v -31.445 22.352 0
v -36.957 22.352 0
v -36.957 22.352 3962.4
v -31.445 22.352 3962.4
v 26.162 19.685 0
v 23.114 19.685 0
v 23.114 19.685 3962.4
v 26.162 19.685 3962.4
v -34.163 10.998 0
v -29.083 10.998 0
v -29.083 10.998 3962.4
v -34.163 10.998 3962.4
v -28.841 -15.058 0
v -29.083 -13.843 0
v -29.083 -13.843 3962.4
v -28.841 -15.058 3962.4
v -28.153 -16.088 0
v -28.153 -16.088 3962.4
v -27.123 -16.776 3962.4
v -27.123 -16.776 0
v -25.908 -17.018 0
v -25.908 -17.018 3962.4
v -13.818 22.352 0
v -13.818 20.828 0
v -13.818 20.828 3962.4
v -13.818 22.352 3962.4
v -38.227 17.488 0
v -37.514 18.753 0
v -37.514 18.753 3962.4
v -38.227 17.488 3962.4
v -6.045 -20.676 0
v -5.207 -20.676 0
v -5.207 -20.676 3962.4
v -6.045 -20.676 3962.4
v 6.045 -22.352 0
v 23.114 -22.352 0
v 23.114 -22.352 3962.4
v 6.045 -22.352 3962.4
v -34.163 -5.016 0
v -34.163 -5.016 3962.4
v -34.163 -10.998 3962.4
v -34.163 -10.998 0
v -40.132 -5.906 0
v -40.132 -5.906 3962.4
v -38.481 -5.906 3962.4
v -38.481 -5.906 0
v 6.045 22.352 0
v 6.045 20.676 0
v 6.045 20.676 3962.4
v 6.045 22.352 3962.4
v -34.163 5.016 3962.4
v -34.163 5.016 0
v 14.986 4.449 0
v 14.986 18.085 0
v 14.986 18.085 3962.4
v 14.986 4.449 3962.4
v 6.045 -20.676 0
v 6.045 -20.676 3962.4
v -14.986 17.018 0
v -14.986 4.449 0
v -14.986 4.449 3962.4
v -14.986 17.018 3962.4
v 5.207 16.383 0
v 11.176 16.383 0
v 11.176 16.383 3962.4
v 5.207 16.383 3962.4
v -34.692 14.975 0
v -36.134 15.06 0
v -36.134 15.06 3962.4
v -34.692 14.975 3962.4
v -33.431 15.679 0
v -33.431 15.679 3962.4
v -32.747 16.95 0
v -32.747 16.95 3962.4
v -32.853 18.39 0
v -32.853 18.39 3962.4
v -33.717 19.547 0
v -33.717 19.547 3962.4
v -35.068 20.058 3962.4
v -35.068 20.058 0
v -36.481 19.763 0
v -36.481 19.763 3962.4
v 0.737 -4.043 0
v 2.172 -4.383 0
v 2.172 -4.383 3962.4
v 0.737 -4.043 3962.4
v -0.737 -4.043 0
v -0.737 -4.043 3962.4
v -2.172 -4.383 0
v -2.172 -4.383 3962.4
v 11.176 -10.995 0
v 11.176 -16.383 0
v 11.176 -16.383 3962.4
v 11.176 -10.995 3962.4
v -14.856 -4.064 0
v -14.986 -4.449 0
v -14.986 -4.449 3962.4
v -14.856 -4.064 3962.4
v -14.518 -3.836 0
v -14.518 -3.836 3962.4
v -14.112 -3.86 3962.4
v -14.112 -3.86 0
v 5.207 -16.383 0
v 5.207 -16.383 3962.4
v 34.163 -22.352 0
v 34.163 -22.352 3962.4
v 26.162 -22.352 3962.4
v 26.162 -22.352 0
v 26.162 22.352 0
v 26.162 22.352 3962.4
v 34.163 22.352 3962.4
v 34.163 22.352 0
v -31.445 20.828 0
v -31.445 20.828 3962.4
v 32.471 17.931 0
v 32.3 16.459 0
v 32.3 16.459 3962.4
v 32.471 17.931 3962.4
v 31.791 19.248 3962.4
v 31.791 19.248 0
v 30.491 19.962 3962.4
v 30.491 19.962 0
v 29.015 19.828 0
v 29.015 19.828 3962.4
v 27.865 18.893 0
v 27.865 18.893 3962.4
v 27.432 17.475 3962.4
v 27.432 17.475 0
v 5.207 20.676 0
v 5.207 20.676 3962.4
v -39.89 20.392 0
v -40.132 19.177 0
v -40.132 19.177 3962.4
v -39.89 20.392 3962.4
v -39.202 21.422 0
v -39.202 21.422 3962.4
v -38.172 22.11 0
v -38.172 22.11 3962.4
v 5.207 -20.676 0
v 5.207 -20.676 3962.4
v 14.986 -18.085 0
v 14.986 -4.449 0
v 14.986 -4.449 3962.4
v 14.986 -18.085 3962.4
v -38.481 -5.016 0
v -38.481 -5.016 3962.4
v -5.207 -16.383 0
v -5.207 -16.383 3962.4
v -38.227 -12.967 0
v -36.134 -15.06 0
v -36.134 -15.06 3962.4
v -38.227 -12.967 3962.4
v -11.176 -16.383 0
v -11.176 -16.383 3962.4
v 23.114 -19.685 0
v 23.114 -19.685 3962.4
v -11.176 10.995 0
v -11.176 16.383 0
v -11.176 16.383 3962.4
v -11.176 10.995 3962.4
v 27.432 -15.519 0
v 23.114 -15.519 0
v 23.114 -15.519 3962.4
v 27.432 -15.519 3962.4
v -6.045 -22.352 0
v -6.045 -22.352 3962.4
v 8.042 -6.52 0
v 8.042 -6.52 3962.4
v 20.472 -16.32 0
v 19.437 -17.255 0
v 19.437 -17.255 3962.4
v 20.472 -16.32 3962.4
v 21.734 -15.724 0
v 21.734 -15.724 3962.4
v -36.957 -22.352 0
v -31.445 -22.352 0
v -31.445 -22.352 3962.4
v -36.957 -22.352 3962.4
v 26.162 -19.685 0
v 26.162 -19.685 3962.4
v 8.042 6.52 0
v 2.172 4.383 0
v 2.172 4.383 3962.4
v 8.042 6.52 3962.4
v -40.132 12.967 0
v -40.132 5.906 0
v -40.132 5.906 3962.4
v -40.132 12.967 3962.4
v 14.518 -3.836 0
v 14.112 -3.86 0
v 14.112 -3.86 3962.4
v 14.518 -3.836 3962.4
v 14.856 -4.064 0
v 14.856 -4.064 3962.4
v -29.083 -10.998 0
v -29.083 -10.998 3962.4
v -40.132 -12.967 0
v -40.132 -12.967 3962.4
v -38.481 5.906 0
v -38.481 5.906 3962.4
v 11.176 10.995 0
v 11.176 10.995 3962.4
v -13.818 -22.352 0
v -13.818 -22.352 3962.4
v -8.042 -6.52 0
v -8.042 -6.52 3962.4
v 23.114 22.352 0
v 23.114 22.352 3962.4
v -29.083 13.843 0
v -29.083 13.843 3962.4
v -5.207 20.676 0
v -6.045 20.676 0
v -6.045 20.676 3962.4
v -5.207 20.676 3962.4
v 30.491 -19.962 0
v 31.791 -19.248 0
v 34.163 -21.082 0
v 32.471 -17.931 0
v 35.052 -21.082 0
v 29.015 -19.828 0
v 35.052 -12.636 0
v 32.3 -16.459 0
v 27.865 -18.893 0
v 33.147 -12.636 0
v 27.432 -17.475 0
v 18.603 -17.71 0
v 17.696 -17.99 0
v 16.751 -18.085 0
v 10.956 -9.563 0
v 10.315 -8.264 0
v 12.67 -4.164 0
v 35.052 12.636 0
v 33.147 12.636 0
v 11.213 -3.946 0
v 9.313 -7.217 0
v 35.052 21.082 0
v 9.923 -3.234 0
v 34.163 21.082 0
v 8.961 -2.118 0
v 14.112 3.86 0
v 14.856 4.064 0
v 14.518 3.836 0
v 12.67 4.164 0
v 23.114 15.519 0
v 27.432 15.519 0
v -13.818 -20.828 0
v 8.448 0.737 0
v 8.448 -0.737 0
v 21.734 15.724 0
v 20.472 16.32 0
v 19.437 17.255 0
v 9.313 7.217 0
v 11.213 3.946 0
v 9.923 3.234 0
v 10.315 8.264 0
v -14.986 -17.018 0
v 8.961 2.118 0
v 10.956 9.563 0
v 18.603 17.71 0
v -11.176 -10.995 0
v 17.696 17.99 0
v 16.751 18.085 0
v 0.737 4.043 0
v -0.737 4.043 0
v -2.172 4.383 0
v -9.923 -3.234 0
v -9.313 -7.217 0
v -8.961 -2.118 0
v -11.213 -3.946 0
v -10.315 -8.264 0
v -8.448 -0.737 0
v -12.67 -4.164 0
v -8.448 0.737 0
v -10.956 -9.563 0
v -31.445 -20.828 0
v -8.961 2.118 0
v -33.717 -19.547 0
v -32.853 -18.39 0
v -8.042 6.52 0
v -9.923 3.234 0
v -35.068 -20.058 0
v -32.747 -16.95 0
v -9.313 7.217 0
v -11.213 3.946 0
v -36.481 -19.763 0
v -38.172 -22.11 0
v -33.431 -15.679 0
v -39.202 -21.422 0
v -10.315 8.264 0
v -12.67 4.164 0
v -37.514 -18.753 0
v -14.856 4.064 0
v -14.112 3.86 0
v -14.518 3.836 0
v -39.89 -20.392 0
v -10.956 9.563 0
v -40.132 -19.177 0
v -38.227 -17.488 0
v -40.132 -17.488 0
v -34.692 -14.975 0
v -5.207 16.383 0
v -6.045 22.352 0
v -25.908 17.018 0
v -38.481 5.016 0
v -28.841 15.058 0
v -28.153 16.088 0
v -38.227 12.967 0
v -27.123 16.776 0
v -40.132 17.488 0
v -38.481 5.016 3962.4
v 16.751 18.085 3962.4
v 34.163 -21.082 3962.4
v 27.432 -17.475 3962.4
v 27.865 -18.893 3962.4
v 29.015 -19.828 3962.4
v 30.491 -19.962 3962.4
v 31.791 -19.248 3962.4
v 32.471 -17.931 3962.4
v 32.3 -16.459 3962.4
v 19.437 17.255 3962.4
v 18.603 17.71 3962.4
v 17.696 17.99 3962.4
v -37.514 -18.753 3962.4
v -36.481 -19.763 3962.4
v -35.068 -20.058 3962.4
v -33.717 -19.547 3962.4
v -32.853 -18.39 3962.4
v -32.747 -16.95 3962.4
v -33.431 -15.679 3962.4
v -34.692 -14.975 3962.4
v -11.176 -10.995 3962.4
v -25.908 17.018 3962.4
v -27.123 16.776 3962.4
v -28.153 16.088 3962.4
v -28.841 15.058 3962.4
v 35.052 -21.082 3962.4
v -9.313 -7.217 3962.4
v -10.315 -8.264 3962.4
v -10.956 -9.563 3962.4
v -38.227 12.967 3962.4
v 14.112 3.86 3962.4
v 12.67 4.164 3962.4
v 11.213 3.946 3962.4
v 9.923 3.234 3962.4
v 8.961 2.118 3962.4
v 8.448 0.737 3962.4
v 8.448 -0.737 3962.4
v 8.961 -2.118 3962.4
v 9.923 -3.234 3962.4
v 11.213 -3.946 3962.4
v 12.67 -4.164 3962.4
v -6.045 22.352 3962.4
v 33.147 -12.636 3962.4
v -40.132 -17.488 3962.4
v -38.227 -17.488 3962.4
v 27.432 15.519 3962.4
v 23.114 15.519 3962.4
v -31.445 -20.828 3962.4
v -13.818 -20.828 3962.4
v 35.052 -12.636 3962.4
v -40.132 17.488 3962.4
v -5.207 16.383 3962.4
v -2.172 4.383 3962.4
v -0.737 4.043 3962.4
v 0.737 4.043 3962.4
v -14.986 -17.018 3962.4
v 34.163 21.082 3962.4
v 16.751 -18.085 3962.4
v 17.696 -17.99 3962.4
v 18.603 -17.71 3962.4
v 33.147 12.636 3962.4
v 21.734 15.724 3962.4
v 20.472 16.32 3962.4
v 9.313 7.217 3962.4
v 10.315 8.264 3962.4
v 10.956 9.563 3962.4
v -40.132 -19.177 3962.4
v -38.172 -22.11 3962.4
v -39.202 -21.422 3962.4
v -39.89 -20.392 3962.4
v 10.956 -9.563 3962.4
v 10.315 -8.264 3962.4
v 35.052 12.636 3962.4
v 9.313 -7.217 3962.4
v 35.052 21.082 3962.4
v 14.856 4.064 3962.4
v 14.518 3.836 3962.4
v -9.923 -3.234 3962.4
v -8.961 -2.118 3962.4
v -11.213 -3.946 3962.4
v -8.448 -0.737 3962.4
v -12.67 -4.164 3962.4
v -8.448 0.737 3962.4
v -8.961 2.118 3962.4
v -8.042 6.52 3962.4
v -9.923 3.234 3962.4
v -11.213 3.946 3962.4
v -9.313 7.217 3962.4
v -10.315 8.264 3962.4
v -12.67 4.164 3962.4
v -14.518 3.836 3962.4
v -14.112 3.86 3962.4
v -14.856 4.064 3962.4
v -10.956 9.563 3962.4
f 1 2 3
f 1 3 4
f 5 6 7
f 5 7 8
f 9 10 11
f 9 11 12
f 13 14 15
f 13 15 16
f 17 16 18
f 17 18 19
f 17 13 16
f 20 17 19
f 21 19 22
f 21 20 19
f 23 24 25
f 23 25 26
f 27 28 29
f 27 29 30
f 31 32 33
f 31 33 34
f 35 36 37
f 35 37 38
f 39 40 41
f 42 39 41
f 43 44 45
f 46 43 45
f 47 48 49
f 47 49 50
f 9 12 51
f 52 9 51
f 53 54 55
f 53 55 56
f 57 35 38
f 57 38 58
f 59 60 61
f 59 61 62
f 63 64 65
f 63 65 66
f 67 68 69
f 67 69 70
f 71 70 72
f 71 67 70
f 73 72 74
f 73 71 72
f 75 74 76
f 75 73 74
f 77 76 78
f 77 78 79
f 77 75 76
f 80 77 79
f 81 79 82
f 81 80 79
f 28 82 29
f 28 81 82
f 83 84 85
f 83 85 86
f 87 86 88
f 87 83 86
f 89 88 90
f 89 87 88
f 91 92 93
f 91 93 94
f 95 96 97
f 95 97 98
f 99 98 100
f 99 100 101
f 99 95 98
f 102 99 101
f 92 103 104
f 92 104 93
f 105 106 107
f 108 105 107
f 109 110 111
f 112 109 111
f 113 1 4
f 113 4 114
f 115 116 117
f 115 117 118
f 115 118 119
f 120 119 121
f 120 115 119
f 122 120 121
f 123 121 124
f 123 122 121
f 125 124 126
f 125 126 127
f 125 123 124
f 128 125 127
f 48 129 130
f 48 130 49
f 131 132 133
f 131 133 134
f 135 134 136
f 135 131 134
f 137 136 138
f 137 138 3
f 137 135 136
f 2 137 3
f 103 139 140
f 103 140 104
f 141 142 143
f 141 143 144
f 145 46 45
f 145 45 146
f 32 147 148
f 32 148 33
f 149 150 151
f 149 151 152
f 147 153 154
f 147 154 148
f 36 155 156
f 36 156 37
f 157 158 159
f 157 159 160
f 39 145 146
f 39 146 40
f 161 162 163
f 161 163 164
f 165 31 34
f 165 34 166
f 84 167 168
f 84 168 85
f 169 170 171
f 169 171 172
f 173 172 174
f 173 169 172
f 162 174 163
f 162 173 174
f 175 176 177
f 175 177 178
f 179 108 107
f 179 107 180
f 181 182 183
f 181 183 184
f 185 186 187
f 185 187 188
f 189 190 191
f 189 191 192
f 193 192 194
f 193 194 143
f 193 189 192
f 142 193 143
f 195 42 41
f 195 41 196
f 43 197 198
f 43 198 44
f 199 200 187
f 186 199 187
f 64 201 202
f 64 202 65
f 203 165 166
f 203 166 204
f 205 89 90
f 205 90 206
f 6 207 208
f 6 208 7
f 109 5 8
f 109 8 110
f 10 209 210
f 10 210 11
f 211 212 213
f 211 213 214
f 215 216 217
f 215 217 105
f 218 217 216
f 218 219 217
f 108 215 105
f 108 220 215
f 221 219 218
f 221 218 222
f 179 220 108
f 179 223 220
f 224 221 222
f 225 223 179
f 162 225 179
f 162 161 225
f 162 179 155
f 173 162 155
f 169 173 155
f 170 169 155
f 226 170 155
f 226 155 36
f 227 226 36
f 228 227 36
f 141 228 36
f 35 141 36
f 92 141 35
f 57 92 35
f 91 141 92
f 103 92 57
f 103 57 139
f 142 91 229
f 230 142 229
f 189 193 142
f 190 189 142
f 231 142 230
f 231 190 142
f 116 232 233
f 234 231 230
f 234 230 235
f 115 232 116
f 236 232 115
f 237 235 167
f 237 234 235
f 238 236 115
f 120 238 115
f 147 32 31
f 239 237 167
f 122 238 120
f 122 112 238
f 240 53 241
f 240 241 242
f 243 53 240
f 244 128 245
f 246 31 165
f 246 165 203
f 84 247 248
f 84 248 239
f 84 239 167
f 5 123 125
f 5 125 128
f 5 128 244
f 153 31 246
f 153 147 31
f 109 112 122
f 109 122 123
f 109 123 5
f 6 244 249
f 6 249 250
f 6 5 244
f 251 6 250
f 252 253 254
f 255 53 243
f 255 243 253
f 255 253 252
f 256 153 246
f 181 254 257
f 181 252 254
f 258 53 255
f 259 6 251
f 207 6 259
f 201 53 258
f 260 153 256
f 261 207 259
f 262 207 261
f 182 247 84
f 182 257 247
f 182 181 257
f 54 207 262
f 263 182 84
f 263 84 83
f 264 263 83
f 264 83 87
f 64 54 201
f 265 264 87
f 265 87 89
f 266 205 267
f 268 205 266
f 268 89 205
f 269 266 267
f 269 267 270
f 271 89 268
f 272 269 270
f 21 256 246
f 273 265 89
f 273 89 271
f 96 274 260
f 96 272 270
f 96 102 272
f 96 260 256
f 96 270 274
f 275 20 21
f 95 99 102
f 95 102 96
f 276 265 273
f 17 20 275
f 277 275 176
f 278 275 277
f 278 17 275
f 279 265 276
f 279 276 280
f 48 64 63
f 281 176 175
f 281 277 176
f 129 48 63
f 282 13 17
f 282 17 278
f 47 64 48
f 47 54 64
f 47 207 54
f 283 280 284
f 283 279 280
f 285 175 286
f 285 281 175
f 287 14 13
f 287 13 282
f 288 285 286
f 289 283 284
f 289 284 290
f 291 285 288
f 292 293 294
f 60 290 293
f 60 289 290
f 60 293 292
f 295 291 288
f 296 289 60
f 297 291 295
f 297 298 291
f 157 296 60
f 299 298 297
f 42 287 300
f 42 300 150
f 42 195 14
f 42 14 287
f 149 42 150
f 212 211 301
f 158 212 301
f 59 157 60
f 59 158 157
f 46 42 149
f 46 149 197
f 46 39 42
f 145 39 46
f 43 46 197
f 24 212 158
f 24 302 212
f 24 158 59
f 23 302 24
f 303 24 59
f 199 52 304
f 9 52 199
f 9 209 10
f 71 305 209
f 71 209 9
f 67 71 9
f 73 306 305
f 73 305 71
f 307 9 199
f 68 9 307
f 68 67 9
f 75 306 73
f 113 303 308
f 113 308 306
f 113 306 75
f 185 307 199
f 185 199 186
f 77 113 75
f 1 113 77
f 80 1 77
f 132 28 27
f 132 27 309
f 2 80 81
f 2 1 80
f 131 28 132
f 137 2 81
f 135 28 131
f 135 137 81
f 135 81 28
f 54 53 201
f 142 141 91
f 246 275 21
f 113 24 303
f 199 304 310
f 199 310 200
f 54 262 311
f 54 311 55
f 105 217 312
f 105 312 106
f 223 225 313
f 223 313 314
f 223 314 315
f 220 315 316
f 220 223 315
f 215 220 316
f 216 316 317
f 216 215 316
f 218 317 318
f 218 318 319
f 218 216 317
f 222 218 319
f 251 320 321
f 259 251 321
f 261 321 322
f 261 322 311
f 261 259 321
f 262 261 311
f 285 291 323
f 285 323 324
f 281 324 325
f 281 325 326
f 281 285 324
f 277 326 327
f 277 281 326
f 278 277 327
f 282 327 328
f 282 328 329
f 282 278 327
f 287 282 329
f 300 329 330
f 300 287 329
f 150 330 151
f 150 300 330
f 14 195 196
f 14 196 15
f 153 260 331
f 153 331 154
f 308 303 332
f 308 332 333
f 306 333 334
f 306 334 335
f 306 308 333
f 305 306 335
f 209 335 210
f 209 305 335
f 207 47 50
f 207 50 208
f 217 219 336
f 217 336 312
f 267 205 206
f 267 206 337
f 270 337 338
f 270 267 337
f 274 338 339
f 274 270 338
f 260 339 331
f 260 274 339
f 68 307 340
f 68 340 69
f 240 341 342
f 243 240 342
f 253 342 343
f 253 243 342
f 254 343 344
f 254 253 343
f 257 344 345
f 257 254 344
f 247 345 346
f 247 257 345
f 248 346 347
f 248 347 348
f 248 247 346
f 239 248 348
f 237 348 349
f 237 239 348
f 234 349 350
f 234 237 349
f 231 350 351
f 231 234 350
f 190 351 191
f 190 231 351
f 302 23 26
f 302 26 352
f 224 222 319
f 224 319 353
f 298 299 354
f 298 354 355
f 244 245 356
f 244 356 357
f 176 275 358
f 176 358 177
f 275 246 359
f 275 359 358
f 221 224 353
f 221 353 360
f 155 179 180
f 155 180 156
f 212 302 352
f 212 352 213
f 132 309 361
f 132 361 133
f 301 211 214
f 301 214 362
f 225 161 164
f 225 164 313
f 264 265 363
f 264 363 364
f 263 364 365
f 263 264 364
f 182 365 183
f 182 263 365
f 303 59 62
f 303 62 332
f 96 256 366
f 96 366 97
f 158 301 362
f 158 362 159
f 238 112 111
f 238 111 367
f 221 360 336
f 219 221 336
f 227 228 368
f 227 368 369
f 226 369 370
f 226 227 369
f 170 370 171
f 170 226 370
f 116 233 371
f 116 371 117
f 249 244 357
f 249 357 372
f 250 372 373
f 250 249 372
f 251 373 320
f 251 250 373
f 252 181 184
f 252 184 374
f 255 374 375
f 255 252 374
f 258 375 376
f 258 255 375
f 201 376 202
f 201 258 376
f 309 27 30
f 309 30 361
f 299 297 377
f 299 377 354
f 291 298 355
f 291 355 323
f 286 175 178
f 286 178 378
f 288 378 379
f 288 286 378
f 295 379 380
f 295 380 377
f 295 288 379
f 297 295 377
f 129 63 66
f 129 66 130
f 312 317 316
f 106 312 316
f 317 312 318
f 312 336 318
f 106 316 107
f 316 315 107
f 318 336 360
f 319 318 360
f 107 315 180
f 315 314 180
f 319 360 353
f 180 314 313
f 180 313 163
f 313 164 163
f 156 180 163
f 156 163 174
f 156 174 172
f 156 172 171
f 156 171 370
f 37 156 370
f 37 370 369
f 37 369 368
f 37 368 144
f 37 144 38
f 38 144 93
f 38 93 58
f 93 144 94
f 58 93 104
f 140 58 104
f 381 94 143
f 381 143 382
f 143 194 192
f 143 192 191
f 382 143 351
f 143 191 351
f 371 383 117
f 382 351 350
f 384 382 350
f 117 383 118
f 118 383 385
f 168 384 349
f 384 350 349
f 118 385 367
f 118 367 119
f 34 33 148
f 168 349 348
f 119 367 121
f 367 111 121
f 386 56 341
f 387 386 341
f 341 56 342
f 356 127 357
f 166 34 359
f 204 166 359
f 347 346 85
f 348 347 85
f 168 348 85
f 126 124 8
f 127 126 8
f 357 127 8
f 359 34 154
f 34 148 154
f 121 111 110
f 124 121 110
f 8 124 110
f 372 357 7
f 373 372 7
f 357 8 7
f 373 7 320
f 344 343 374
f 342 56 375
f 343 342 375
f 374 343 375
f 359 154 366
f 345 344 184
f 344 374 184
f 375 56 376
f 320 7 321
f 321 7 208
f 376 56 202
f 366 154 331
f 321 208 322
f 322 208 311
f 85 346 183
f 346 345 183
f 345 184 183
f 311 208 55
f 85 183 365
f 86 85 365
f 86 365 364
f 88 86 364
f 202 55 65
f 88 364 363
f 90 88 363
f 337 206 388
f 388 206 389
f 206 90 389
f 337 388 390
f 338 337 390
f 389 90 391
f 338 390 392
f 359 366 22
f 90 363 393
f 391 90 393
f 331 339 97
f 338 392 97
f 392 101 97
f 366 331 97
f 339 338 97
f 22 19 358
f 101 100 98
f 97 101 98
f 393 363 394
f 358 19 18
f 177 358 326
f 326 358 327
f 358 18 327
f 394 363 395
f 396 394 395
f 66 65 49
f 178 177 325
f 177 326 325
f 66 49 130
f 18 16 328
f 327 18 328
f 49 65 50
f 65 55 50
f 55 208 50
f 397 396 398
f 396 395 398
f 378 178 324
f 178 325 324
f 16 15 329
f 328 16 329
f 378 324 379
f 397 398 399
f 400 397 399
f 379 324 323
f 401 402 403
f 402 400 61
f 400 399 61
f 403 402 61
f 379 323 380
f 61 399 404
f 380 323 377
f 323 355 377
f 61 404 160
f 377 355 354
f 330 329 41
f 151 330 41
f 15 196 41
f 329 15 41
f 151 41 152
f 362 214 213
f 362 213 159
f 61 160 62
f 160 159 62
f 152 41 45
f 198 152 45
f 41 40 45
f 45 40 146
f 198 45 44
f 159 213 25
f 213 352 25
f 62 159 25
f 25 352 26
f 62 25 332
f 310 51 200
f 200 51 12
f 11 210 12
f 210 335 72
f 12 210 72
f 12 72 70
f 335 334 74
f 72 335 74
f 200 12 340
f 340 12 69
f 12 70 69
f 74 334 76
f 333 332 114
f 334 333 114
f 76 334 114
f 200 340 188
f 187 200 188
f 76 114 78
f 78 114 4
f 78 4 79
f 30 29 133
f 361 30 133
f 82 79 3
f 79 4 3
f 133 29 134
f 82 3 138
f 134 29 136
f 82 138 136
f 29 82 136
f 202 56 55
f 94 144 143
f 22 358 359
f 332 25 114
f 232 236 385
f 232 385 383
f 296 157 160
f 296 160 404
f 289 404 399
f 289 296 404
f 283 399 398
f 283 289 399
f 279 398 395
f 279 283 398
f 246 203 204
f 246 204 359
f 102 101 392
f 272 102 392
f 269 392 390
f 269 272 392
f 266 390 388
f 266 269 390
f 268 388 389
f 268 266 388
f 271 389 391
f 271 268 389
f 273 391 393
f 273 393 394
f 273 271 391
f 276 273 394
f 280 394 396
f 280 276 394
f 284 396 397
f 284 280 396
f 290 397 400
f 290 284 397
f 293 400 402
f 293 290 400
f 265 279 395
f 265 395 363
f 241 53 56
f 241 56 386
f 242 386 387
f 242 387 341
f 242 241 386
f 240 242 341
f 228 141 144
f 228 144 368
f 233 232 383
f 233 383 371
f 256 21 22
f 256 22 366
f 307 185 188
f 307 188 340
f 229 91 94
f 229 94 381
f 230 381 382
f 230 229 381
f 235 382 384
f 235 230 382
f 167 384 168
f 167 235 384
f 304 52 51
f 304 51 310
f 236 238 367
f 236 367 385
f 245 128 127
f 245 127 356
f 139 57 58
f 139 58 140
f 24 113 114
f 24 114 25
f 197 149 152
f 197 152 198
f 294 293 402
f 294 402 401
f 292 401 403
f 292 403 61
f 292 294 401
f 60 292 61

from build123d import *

# Parameters (mm, degrees)
EXTRUDE1_DEPTH = 3962.4


with BuildPart() as part:
    # Sketch1 → Extrude1 (new body)
    with BuildSketch(Plane.XY):
        with BuildLine():
            Line((-8.042370933, 6.520154777), (-2.17182791, 4.383451858))
            ThreePointArc((-2.17182791, 4.383451858), (0, 4.0005), (2.17182791, 4.383451858))
            Line((2.17182791, 4.383451858), (8.042370933, 6.520154777))
            ThreePointArc((8.042370933, 6.520154777), (10.314711611, 8.263783106), (11.176, 10.995440884))
            Line((11.176, 10.995440884), (11.176, 16.383))
            Line((11.176, 16.383), (5.207, 16.383))
            Line((5.207, 16.383), (5.207, 20.6756))
            Line((5.207, 20.6756), (6.0452, 20.6756))
            Line((6.0452, 20.6756), (6.0452, 22.352))
            Line((6.0452, 22.352), (23.114, 22.352))
            Line((23.114, 22.352), (23.114, 19.685))
            Line((23.114, 19.685), (26.162, 19.685))
            Line((26.162, 19.685), (26.162, 22.352))
            Line((26.162, 22.352), (34.163, 22.352))
            Line((34.163, 22.352), (34.163, 21.082))
            Line((34.163, 21.082), (35.052, 21.082))
            Line((35.052, 21.082), (35.052, 12.6365))
            Line((35.052, 12.6365), (33.147, 12.6365))
            Line((33.147, 12.6365), (32.299669473, 16.458561015))
            ThreePointArc((32.299669473, 16.458561015), (30.491287752, 19.961550786), (27.432, 17.4752))
            Line((27.432, 17.4752), (27.432, 15.5194))
            Line((27.432, 15.5194), (23.114, 15.5194))
            ThreePointArc((23.114, 15.5194), (21.080787287, 15.97522468), (19.436777108, 17.255443647))
            ThreePointArc((19.436777108, 17.255443647), (18.156613066, 17.872739697), (16.7513, 18.0848))
            Line((16.7513, 18.0848), (14.986, 18.0848))
            Line((14.986, 18.0848), (14.986, 4.448989638))
            ThreePointArc((14.986, 4.448989638), (14.705787924, 3.922348841), (14.112455026, 3.860498945))
            ThreePointArc((14.112455026, 3.860498945), (8.382, 0), (14.112455026, -3.860498945))
            ThreePointArc((14.112455026, -3.860498945), (14.705787924, -3.922348841), (14.986, -4.448989638))
            Line((14.986, -4.448989638), (14.986, -18.0848))
            Line((14.986, -18.0848), (16.7513, -18.0848))
            ThreePointArc((16.7513, -18.0848), (18.156613066, -17.872739697), (19.436777108, -17.255443647))
            ThreePointArc((19.436777108, -17.255443647), (21.080787287, -15.97522468), (23.114, -15.5194))
            Line((23.114, -15.5194), (27.432, -15.5194))
            Line((27.432, -15.5194), (27.432, -17.4752))
            ThreePointArc((27.432, -17.4752), (30.491287752, -19.961550786), (32.299669473, -16.458561015))
            Line((32.299669473, -16.458561015), (33.147, -12.6365))
            Line((33.147, -12.6365), (35.052, -12.6365))
            Line((35.052, -12.6365), (35.052, -21.082))
            Line((35.052, -21.082), (34.163, -21.082))
            Line((34.163, -21.082), (34.163, -22.352))
            Line((34.163, -22.352), (26.162, -22.352))
            Line((26.162, -22.352), (26.162, -19.685))
            Line((26.162, -19.685), (23.114, -19.685))
            Line((23.114, -19.685), (23.114, -22.352))
            Line((23.114, -22.352), (6.0452, -22.352))
            Line((6.0452, -22.352), (6.0452, -20.6756))
            Line((6.0452, -20.6756), (5.207, -20.6756))
            Line((5.207, -20.6756), (5.207, -16.383))
            Line((5.207, -16.383), (11.176, -16.383))
            Line((11.176, -16.383), (11.176, -10.995440884))
            ThreePointArc((11.176, -10.995440884), (10.314711611, -8.263783106), (8.042370933, -6.520154777))
            Line((8.042370933, -6.520154777), (2.17182791, -4.383451858))
            ThreePointArc((2.17182791, -4.383451858), (0, -4.0005), (-2.17182791, -4.383451858))
            Line((-2.17182791, -4.383451858), (-8.042370933, -6.520154777))
            ThreePointArc((-8.042370933, -6.520154777), (-10.314711611, -8.263783106), (-11.176, -10.995440884))
            Line((-11.176, -10.995440884), (-11.176, -16.383))
            Line((-11.176, -16.383), (-5.207, -16.383))
            Line((-5.207, -16.383), (-5.207, -20.6756))
            Line((-5.207, -20.6756), (-6.0452, -20.6756))
            Line((-6.0452, -20.6756), (-6.0452, -22.352))
            Line((-6.0452, -22.352), (-13.8176, -22.352))
            Line((-13.8176, -22.352), (-13.8176, -20.828))
            Line((-13.8176, -20.828), (-31.4452, -20.828))
            Line((-31.4452, -20.828), (-31.4452, -22.352))
            Line((-31.4452, -22.352), (-36.957, -22.352))
            ThreePointArc((-36.957, -22.352), (-39.20206403, -21.42206403), (-40.132, -19.177))
            Line((-40.132, -19.177), (-40.132, -17.4879))
            Line((-40.132, -17.4879), (-38.227, -17.4879))
            Line((-38.227, -17.4879), (-37.514055794, -18.753357925))
            ThreePointArc((-37.514055794, -18.753357925), (-32.852848443, -18.390189081), (-36.134047833, -15.059652167))
            Line((-36.134047833, -15.059652167), (-38.227, -12.9667))
            Line((-38.227, -12.9667), (-40.132, -12.9667))
            Line((-40.132, -12.9667), (-40.132, -5.9055))
            Line((-40.132, -5.9055), (-38.481, -5.9055))
            Line((-38.481, -5.9055), (-38.481, -5.0165))
            Line((-38.481, -5.0165), (-34.163, -5.0165))
            Line((-34.163, -5.0165), (-34.163, -10.9982))
            Line((-34.163, -10.9982), (-29.083, -10.9982))
            Line((-29.083, -10.9982), (-29.083, -13.843))
            ThreePointArc((-29.083, -13.843), (-28.15306403, -16.08806403), (-25.908, -17.018))
            Line((-25.908, -17.018), (-14.986, -17.018))
            Line((-14.986, -17.018), (-14.986, -4.448989638))
            ThreePointArc((-14.986, -4.448989638), (-14.705787924, -3.922348841), (-14.112455026, -3.860498945))
            ThreePointArc((-14.112455026, -3.860498945), (-8.382, 0), (-14.112455026, 3.860498945))
            ThreePointArc((-14.112455026, 3.860498945), (-14.705787924, 3.922348841), (-14.986, 4.448989638))
            Line((-14.986, 4.448989638), (-14.986, 17.018))
            Line((-14.986, 17.018), (-25.908, 17.018))
            ThreePointArc((-25.908, 17.018), (-28.15306403, 16.08806403), (-29.083, 13.843))
            Line((-29.083, 13.843), (-29.083, 10.9982))
            Line((-29.083, 10.9982), (-34.163, 10.9982))
            Line((-34.163, 10.9982), (-34.163, 5.0165))
            Line((-34.163, 5.0165), (-38.481, 5.0165))
            Line((-38.481, 5.0165), (-38.481, 5.9055))
            Line((-38.481, 5.9055), (-40.132, 5.9055))
            Line((-40.132, 5.9055), (-40.132, 12.9667))
            Line((-40.132, 12.9667), (-38.227, 12.9667))
            Line((-38.227, 12.9667), (-36.134047833, 15.059652167))
            ThreePointArc((-36.134047833, 15.059652167), (-32.852848443, 18.390189081), (-37.514055794, 18.753357925))
            Line((-37.514055794, 18.753357925), (-38.227, 17.4879))
            Line((-38.227, 17.4879), (-40.132, 17.4879))
            Line((-40.132, 17.4879), (-40.132, 19.177))
            ThreePointArc((-40.132, 19.177), (-39.20206403, 21.42206403), (-36.957, 22.352))
            Line((-36.957, 22.352), (-31.4452, 22.352))
            Line((-31.4452, 22.352), (-31.4452, 20.828))
            Line((-31.4452, 20.828), (-13.8176, 20.828))
            Line((-13.8176, 20.828), (-13.8176, 22.352))
            Line((-13.8176, 22.352), (-6.0452, 22.352))
            Line((-6.0452, 22.352), (-6.0452, 20.6756))
            Line((-6.0452, 20.6756), (-5.207, 20.6756))
            Line((-5.207, 20.6756), (-5.207, 16.383))
            Line((-5.207, 16.383), (-11.176, 16.383))
            Line((-11.176, 16.383), (-11.176, 10.995440884))
            ThreePointArc((-11.176, 10.995440884), (-10.314711611, 8.263783106), (-8.042370933, 6.520154777))
        make_face()
    extrude(amount=EXTRUDE1_DEPTH)


solid = part.part
